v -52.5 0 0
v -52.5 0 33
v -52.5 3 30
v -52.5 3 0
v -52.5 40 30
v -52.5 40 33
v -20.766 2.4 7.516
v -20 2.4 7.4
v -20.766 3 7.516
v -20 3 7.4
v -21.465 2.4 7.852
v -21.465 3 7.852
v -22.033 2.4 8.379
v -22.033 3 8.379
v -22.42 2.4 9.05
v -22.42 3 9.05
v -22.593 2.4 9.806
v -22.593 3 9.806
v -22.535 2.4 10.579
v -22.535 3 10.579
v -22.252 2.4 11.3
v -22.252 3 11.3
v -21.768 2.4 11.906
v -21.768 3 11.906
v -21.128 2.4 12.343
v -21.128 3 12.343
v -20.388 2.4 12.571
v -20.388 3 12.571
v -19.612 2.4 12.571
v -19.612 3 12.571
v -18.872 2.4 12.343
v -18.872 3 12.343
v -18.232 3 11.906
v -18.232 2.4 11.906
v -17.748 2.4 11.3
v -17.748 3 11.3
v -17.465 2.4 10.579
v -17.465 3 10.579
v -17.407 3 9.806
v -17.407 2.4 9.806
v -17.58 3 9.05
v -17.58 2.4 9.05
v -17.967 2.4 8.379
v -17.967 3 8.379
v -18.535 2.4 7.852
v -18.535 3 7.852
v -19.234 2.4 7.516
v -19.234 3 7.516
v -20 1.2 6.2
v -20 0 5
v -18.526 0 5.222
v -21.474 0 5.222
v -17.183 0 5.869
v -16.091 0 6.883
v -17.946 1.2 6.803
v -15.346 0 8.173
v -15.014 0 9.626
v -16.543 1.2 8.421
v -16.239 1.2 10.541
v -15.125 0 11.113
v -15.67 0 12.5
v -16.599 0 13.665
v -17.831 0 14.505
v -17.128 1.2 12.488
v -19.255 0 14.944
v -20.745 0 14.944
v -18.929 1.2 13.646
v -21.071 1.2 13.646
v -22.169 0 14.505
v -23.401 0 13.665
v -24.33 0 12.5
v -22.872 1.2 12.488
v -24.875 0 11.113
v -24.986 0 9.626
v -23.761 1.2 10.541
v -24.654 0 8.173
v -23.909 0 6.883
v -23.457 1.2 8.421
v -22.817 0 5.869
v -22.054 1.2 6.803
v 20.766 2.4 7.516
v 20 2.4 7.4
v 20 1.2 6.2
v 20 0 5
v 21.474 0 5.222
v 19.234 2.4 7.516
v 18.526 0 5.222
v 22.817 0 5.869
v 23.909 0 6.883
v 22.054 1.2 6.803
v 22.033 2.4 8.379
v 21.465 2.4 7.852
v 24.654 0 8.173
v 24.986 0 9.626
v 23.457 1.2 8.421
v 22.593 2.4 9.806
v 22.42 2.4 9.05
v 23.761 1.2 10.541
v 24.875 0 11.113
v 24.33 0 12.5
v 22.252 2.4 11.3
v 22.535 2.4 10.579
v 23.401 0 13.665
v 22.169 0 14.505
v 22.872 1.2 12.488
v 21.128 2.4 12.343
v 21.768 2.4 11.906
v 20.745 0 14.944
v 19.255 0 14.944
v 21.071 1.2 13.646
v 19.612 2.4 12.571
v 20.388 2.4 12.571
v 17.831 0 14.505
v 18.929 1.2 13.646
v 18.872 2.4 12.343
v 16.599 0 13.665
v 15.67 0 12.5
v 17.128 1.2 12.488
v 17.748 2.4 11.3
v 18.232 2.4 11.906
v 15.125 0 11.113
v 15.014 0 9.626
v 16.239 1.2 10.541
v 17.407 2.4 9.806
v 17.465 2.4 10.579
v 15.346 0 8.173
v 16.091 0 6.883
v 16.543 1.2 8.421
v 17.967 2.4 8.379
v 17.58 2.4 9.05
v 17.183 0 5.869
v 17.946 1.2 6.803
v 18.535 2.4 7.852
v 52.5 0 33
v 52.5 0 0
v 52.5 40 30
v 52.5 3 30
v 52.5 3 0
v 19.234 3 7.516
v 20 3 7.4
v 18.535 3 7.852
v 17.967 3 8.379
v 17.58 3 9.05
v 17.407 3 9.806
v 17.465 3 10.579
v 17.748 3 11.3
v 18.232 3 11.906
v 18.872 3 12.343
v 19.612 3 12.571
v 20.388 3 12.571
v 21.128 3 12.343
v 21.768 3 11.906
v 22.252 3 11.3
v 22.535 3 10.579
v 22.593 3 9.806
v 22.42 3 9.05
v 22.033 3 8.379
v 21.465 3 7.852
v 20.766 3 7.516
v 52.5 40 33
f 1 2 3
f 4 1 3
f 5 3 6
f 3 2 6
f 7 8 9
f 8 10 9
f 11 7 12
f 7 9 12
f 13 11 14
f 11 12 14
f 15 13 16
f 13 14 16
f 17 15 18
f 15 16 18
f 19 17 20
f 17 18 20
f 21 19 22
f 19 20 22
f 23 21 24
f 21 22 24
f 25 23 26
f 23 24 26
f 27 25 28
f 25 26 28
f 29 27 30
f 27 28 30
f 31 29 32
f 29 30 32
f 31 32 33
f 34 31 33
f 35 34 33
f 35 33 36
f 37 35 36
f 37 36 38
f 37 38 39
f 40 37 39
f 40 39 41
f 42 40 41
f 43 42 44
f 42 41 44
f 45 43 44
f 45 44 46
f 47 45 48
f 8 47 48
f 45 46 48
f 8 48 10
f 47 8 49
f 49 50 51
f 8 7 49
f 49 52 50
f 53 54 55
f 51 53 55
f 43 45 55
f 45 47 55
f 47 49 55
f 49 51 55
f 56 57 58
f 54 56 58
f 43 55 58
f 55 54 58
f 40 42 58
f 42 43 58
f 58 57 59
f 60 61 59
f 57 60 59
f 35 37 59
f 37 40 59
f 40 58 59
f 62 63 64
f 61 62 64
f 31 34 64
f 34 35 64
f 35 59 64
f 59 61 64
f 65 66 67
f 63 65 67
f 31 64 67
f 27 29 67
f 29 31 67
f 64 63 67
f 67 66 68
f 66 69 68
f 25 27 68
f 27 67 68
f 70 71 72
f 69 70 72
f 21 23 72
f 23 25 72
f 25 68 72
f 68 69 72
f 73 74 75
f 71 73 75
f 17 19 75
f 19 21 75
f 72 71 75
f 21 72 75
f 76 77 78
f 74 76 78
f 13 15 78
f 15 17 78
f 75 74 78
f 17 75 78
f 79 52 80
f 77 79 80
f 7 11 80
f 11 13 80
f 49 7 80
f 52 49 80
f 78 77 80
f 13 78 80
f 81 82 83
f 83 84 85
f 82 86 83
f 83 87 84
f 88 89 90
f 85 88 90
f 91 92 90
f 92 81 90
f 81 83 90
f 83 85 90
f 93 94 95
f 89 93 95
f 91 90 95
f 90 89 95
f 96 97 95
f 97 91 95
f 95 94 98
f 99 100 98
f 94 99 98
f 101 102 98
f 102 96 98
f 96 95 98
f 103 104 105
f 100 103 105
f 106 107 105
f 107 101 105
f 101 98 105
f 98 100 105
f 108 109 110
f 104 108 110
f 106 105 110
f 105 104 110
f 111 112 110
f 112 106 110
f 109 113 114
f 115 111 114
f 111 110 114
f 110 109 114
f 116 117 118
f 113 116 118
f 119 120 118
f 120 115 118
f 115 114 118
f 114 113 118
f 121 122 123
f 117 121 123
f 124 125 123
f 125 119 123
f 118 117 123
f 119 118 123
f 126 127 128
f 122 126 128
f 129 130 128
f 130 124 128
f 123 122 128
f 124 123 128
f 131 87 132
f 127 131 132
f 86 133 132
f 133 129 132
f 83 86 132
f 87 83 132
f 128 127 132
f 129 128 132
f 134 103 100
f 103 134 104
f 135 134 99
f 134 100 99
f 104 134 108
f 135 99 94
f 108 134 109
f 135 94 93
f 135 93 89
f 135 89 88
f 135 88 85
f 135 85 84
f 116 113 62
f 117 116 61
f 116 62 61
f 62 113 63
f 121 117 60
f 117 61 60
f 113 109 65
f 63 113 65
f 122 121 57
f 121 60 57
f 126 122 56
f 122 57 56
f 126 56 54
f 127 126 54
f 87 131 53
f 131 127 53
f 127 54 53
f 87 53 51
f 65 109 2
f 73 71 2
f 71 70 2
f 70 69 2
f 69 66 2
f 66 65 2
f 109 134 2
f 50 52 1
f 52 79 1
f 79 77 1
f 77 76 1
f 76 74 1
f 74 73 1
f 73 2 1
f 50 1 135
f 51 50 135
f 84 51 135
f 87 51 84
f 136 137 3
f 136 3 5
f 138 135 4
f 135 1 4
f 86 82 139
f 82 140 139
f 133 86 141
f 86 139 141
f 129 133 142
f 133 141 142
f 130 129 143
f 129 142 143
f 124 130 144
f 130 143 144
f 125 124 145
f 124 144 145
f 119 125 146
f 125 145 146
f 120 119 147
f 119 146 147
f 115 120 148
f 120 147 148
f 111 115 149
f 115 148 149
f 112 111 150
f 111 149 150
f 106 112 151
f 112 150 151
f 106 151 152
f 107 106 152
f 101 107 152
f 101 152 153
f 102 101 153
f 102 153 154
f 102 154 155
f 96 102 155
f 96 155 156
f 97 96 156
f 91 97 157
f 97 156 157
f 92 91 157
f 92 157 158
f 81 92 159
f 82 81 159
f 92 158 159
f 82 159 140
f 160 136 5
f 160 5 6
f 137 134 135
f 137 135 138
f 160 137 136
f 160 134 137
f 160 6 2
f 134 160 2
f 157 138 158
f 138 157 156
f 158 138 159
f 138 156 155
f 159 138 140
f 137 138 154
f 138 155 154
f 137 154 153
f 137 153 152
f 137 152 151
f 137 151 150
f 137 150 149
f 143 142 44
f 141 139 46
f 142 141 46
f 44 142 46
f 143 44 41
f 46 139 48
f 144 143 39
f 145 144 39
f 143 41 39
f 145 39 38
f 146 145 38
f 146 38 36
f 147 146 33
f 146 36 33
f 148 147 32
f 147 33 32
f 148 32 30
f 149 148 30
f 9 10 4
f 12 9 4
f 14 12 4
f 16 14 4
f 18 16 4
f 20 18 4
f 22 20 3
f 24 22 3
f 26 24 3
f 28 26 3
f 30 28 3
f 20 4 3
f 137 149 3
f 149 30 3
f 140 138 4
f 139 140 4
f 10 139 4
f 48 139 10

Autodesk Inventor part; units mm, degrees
ref_plane "YZ Plane" through (0, 0, 0) normal (1, 0, 0) x (0, 1, 0)
ref_plane "XZ Plane" through (0, 0, 0) normal (0, 1, 0) x (-1, 0, 0)
ref_plane "XY Plane" through (0, 0, 0) normal (0, 0, 1) x (1, 0, 0)
sketch "Skizze1" plane through (0, 0, 0) normal (1, 0, 0) x (0, 1, 0)
  line L0 (0, 0) -> (3, 0)
  line L1 (3, 0) -> (3, 30)
  line L2 (3, 30) -> (0, 30)
  line L3 (0, 30) -> (0, 0)
  line L4 (0, 30) -> (40, 30)
  line L5 (40, 30) -> (40, 33)
  line L6 (40, 33) -> (0, 33)
  line L7 (0, 33) -> (0, 30)
  dimension "d1" = 3
  dimension "d2" = 30
  dimension "d3" = 40
  dimension "d4" = 3
extrude "Extrusion1" add sketch "Skizze1" along normal mid plane 105
sketch "Skizze2" plane through (-52.5, 0, 0) normal (0, -1, 0) x (1, 0, 0)
  line L0 (10.5897, 10) -> (79.1743, 10) construction
  line L1 (0, 0) -> (105, 0) construction
  line L2 (52.5, 0) -> (52.5, 22.0905) construction
  point P0 (32.5, 10)
  point P1 (72.5, 10)
  dimension "d7" = 10
  dimension "d8" = 20
hole "Bohrung1" at (-20, 0, 10) at (20, 0, 10) direction (0, 1, 0) diameter 5.2 end through all countersink diameter 10 countersink angle 90
equation "\"d5\" = Magazin_Breite"
equation "\"Magazin_Breite\" = 105"
properties part number "TS_Magazin_Begrenzung_int"
